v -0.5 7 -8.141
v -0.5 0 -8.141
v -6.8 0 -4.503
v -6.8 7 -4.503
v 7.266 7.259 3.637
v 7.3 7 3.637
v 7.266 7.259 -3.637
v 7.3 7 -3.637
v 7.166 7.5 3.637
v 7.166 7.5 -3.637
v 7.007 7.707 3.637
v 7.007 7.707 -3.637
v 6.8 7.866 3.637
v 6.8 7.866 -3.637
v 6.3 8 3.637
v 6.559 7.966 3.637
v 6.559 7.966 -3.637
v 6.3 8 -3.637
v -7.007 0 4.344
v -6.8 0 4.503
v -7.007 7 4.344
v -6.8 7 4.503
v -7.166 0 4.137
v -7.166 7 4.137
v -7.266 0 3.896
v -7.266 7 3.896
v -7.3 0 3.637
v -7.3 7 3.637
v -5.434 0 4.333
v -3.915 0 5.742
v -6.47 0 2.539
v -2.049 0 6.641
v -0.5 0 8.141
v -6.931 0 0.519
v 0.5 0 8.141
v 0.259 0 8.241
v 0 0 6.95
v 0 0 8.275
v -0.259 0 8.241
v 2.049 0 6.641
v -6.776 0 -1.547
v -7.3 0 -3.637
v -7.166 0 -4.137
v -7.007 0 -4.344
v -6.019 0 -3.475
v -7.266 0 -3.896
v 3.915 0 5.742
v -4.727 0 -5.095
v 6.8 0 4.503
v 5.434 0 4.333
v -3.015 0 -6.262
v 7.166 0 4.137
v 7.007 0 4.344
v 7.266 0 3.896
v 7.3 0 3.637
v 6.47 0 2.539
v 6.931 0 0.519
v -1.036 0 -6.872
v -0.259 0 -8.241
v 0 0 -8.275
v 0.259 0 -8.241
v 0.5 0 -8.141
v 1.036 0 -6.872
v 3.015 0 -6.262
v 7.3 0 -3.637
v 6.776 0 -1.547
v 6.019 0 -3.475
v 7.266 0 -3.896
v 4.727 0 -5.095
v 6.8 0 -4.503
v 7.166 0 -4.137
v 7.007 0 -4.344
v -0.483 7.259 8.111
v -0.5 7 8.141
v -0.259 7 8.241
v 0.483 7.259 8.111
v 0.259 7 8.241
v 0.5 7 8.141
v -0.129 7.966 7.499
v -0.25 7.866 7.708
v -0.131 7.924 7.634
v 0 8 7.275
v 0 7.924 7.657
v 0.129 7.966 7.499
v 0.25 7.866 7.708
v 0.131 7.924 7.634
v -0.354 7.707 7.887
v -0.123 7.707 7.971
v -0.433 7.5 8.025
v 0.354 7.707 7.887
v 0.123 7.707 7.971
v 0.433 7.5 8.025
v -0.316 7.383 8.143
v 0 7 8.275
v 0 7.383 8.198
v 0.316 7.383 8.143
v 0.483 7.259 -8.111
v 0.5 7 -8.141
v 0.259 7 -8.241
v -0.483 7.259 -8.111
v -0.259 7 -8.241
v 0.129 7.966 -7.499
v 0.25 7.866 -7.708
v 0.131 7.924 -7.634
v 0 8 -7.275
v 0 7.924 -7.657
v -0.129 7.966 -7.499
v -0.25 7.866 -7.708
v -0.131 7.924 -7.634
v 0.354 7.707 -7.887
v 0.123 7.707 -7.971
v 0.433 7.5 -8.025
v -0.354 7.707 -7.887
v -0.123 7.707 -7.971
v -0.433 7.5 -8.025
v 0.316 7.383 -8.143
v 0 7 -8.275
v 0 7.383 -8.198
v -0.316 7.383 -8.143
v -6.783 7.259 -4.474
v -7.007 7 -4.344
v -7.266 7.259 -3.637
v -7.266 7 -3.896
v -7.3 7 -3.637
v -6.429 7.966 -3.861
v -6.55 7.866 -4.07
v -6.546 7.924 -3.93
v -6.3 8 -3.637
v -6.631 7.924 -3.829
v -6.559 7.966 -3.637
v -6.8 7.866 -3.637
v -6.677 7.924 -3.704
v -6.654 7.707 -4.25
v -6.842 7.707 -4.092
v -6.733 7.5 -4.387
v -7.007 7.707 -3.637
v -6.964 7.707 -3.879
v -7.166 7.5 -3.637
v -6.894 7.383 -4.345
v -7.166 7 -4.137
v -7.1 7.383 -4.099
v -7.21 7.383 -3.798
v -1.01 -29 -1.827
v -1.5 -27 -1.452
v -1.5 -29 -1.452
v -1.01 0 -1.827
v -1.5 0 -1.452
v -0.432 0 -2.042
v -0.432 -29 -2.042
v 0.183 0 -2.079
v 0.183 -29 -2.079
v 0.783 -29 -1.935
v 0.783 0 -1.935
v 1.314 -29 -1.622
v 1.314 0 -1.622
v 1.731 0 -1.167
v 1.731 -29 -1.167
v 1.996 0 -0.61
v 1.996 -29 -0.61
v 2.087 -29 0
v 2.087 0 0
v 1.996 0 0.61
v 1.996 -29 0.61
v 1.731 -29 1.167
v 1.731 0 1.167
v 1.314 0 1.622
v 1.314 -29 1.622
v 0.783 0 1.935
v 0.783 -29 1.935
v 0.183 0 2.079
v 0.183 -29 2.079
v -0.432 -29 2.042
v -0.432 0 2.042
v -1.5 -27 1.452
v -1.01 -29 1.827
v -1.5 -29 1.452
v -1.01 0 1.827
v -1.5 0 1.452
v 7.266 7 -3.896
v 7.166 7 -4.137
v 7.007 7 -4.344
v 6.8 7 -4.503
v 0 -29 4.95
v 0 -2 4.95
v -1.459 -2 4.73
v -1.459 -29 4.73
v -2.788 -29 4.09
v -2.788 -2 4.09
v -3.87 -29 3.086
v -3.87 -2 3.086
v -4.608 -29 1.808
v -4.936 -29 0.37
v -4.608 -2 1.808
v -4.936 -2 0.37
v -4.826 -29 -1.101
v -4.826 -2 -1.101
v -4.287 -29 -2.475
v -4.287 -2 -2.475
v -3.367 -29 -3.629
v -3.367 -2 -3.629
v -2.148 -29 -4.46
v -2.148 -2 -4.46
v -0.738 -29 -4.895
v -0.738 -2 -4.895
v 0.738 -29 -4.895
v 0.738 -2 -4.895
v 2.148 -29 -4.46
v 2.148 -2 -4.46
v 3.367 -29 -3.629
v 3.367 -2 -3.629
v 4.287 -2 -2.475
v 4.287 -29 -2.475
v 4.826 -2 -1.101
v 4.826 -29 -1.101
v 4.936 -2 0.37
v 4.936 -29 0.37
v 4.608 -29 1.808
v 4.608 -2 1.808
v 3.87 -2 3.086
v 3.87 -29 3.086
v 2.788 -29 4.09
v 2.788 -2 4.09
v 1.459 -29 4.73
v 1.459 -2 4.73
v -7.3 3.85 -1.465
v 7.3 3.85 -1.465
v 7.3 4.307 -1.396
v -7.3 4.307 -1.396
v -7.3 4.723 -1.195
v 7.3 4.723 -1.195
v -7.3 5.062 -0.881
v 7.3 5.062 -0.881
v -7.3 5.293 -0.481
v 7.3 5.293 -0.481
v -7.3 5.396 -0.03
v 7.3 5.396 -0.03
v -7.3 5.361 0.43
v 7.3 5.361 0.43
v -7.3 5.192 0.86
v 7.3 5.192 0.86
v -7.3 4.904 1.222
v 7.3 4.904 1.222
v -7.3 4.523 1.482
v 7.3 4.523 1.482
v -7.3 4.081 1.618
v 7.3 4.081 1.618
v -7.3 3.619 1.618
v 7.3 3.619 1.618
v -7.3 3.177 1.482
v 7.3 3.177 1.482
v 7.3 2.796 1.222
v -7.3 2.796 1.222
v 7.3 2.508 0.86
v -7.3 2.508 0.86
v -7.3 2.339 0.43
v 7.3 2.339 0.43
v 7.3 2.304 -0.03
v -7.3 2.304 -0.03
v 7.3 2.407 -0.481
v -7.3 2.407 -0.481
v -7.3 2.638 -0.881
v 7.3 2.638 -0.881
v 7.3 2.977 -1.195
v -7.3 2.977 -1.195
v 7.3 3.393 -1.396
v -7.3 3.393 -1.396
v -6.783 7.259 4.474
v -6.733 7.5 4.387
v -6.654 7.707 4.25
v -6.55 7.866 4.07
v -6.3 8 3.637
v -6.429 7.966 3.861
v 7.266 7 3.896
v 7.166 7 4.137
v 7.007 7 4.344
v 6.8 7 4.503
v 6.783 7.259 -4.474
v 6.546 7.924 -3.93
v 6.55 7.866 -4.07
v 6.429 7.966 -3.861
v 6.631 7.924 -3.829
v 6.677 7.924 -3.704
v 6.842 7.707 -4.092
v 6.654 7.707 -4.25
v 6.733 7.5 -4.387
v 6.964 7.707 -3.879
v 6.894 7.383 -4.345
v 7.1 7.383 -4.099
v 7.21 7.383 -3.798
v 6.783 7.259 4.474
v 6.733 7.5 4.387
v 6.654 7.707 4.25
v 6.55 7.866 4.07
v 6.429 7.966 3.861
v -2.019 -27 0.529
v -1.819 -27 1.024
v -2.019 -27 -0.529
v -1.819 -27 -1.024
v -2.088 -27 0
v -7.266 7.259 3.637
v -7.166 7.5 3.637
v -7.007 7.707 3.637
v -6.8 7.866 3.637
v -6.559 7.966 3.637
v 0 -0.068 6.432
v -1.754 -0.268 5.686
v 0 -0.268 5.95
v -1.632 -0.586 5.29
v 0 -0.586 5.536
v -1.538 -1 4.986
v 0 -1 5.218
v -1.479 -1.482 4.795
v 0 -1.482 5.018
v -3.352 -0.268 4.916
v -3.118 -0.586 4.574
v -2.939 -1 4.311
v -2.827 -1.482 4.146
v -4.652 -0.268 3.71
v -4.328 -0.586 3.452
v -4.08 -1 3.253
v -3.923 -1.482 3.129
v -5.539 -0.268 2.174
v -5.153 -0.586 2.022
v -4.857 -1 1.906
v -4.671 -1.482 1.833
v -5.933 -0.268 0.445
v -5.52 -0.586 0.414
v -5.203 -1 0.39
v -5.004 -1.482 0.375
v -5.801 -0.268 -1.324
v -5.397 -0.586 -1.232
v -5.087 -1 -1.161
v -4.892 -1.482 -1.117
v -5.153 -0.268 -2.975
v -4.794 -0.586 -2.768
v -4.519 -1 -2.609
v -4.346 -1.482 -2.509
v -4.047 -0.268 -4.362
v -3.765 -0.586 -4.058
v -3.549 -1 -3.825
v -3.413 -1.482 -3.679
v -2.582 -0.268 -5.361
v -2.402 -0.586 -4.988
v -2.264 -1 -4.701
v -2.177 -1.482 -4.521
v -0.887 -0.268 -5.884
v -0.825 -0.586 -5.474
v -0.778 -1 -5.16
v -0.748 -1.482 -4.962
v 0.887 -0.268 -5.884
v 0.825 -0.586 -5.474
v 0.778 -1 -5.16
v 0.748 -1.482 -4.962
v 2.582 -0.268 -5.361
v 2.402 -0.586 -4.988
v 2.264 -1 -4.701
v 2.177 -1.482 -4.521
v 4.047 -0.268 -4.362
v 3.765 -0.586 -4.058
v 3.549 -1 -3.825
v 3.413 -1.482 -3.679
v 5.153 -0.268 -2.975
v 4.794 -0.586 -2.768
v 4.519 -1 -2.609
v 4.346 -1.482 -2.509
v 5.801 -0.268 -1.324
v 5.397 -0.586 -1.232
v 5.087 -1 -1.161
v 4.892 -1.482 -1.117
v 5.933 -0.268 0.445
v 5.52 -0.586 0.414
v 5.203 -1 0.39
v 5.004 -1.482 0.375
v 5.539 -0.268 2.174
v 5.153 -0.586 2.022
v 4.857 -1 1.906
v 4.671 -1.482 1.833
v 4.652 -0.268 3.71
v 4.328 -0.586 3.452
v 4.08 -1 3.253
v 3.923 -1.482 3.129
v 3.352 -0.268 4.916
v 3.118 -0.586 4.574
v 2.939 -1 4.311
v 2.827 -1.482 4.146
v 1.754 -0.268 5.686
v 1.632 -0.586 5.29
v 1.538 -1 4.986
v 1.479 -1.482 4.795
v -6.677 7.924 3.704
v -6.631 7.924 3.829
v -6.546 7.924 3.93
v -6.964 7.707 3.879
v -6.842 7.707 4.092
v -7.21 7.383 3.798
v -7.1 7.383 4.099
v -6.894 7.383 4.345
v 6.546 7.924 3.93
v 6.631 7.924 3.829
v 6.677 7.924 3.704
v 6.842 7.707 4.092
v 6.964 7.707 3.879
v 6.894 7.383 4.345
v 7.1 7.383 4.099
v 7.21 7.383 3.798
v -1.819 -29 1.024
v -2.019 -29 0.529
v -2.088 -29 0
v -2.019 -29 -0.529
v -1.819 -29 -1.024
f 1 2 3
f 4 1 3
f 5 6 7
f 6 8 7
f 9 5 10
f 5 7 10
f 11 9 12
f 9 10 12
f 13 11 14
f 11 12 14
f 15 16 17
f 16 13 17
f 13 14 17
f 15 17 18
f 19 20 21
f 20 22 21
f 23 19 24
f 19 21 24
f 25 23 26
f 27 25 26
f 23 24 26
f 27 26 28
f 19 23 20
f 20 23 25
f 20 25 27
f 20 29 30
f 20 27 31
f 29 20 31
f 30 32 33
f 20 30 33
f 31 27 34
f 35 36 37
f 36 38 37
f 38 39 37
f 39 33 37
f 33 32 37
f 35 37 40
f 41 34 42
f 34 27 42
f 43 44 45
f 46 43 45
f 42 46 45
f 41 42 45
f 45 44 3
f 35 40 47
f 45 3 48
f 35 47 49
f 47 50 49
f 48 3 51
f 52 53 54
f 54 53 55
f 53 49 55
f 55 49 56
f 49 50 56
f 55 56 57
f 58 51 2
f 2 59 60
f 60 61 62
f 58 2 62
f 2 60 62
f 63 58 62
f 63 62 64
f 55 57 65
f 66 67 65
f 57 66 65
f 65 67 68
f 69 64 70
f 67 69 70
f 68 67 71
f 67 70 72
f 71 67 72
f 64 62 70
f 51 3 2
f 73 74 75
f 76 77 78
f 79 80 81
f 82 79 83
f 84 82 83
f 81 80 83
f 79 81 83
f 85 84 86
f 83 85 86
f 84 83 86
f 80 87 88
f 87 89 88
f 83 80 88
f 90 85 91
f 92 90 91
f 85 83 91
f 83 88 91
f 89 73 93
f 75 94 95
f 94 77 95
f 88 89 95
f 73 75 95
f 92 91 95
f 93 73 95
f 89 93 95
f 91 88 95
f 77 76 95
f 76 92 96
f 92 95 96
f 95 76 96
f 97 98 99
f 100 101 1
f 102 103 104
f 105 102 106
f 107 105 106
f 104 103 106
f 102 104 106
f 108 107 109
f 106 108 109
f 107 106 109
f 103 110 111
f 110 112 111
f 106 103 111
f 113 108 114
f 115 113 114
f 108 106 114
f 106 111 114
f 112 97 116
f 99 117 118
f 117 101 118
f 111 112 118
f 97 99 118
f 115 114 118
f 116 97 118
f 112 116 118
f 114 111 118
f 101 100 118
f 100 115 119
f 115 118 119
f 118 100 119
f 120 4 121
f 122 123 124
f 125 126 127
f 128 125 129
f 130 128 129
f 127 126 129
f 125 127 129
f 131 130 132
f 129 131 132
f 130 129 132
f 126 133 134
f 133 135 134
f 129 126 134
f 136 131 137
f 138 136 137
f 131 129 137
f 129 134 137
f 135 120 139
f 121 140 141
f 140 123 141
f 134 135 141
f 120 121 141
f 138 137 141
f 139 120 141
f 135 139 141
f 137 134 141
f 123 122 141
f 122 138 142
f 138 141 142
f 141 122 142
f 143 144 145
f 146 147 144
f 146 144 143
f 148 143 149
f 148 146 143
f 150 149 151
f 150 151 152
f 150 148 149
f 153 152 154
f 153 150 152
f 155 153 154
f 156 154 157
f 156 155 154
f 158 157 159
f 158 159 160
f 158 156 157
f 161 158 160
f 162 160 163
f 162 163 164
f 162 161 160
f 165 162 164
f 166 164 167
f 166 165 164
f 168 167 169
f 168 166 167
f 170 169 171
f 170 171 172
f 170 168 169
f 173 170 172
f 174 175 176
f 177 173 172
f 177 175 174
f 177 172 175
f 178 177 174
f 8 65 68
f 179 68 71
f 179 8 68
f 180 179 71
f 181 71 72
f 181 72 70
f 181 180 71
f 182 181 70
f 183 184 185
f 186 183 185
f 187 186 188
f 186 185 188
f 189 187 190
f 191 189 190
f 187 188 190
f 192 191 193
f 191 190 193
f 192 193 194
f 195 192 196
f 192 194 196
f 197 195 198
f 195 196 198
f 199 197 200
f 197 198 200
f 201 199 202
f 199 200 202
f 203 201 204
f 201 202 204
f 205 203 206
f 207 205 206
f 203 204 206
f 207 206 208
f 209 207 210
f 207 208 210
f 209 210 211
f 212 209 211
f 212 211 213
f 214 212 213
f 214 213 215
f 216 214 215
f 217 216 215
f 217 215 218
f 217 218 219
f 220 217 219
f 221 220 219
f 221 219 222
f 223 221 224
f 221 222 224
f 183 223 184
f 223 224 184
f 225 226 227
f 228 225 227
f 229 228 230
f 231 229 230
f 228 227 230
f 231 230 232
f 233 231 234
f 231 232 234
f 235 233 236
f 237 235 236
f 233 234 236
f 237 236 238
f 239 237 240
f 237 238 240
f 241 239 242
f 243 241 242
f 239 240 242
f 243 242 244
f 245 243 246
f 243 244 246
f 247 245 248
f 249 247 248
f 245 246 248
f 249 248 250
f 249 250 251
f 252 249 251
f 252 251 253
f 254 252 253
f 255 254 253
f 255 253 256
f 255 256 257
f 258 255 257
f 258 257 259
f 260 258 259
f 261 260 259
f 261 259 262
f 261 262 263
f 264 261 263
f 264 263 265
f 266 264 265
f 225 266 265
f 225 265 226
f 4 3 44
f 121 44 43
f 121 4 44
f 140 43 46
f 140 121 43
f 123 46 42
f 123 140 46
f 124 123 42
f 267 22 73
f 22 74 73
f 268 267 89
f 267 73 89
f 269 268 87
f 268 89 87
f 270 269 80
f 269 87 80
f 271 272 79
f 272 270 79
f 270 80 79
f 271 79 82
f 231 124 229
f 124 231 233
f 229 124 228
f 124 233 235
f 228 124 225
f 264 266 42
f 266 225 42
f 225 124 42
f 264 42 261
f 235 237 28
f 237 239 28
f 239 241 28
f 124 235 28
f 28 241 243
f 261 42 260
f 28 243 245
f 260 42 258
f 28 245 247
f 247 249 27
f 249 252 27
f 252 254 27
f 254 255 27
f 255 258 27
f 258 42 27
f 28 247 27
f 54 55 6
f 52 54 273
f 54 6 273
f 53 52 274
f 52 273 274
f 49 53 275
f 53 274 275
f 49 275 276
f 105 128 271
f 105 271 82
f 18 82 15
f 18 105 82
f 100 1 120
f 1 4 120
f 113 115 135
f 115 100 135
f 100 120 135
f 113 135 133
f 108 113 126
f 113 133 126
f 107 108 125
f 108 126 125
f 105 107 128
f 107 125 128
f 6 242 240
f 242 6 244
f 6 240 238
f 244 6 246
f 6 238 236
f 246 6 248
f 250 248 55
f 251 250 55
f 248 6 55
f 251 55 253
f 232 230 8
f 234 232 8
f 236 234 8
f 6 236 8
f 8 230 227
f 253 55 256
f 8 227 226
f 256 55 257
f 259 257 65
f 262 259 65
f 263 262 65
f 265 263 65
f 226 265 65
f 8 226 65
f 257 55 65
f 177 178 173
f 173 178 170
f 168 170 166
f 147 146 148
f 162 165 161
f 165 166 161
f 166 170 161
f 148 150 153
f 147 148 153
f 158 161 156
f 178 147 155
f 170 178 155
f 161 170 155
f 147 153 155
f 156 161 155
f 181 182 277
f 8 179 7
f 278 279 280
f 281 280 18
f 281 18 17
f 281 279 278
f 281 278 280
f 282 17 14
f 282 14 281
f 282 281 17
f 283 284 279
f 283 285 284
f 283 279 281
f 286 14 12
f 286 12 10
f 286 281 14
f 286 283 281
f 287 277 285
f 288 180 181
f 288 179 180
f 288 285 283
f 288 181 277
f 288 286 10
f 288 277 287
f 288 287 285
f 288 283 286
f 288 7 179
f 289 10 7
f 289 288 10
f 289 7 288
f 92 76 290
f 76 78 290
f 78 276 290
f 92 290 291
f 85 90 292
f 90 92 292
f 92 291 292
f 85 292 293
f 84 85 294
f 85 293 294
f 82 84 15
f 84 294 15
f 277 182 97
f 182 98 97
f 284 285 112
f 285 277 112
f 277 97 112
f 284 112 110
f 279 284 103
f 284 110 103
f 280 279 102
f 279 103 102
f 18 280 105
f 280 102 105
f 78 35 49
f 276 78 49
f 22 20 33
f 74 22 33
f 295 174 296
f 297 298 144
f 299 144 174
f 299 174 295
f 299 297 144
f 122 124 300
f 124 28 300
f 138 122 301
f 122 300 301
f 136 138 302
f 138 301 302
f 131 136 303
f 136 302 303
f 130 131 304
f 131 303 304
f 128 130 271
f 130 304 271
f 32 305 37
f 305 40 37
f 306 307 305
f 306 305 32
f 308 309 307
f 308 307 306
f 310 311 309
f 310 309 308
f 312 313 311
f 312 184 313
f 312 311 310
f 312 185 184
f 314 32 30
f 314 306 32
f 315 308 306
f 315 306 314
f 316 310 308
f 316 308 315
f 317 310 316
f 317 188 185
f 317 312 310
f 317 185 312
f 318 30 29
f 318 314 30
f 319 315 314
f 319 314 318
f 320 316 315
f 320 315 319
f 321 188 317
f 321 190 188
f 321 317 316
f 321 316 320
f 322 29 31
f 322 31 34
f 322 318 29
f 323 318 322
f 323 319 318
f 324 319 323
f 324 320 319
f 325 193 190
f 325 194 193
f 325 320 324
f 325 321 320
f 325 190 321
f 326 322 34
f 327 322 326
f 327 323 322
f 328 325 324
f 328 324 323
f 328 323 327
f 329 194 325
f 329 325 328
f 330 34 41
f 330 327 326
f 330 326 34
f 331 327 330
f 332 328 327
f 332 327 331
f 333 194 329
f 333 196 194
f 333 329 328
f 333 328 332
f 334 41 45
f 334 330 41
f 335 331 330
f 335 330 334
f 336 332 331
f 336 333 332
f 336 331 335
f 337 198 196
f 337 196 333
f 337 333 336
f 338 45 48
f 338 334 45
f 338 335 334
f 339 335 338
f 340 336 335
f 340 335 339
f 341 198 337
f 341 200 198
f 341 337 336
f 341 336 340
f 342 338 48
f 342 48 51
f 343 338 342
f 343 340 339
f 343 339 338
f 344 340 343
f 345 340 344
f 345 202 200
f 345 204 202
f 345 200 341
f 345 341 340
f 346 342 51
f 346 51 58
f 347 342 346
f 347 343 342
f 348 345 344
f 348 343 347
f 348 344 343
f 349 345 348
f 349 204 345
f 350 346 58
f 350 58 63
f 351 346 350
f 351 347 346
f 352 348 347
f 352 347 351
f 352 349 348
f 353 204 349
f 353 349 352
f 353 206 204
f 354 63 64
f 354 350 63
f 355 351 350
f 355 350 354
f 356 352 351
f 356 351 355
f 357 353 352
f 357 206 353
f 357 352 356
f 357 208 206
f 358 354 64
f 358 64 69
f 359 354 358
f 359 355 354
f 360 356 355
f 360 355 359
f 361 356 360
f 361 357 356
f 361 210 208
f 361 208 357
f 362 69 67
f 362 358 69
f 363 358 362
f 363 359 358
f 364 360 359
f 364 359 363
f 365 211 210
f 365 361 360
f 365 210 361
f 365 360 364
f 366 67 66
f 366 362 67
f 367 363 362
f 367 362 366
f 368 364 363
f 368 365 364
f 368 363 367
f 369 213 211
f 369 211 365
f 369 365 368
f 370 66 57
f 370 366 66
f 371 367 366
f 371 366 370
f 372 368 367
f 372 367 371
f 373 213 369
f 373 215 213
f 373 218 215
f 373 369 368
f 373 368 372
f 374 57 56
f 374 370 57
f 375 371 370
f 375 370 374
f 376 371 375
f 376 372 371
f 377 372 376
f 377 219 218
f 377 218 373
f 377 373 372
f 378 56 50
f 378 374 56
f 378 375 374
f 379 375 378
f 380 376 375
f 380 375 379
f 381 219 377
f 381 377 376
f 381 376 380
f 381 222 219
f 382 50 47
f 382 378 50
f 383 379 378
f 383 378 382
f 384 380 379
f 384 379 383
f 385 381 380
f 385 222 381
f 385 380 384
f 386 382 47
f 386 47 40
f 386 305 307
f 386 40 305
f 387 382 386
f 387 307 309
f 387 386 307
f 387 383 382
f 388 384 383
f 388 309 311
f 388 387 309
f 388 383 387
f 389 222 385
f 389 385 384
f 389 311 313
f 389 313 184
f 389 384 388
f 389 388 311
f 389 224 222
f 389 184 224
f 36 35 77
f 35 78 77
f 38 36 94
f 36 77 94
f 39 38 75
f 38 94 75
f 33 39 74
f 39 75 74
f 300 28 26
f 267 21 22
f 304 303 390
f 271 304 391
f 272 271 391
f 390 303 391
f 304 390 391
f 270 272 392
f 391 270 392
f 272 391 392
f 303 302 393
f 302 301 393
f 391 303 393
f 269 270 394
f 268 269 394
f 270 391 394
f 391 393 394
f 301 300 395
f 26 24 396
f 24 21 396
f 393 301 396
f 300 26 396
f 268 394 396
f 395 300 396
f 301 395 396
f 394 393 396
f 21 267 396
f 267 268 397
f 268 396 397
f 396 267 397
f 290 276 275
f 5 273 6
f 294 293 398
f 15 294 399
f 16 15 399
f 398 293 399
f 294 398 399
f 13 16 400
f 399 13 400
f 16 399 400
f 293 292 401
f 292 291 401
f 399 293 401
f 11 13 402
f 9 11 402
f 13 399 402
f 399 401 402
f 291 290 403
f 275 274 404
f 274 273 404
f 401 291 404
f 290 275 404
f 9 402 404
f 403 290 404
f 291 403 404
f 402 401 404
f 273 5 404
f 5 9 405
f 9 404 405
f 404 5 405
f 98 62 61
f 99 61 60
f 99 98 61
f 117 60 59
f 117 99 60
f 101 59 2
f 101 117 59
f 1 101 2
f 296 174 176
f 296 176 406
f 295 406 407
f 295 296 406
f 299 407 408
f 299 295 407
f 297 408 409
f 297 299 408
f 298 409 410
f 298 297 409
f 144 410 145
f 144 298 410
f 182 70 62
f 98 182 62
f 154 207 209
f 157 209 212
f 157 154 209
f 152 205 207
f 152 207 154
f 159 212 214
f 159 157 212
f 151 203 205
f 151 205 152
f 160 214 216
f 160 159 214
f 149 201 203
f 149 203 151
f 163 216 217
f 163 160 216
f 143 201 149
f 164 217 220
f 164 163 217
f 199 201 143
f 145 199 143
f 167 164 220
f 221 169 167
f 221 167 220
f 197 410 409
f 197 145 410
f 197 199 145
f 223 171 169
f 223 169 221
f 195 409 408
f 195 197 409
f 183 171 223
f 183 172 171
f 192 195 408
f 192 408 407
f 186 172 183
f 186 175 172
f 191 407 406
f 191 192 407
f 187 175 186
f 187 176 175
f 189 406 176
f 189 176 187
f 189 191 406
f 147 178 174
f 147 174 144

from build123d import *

# Parameters (mm, degrees)
BOSS_EXTRUDE1_DEPTH = 8
SKETCH2_R           = 4.95
BOSS_EXTRUDE2_DEPTH = 29
FILLET1_R           = 2
SKETCH3_R           = 1.55
CUT_EXTRUDE1_DEPTH  = 34.544199697
FILLET2_R           = 1
CUT_EXTRUDE3_START  = -2
SKETCH5_R           = 2.0875
CUT_EXTRUDE3_DEPTH  = 2


with BuildPart() as part:
    # Sketch1 → Boss-Extrude1 (new body)
    with BuildSketch(Plane(origin=(0, 0, 0), x_dir=(1, 0, 0), z_dir=(0, 1, 0))):
        Polygon((7.3, -4.214656965), (7.3, 4.214656965), (0, 8.42931393), (-7.3, 4.214656965), (-7.3, -4.214656965), (0, -8.42931393), align=None)
    extrude(amount=BOSS_EXTRUDE1_DEPTH)

    # Sketch2 → Boss-Extrude2 (add)
    with BuildSketch(Plane.XZ):
        with Locations(Location((0, 0, 0), (0, 0, 90))):
            Circle(SKETCH2_R)
        with BuildLine():
            Line((-1.5, 1.451776928), (-1.5, -1.451776928))
            ThreePointArc((-1.5, -1.451776928), (2.0875, 0), (-1.5, 1.451776928))
        make_face(mode=Mode.SUBTRACT)
    extrude(amount=BOSS_EXTRUDE2_DEPTH)

    # Fillet1
    fillet1_edges = [part.edges().sort_by_distance(p)[0] for p in [
        (0, 0, -4.95),
    ]]
    fillet(fillet1_edges, radius=FILLET1_R)

    # Sketch3 → Cut-Extrude1 (cut, through all)
    with BuildSketch(Plane(origin=(7.3, 0, 0), x_dir=(0, 0, -1), z_dir=(1, 0, 0))):
        with Locations((-0.085343035, 3.85)):
            Circle(SKETCH3_R)
    extrude(amount=-CUT_EXTRUDE1_DEPTH, mode=Mode.SUBTRACT)

    # Fillet2
    fillet2_edges = [part.edges().sort_by_distance(p)[0] for p in [
        (0, 4, 8.42931393),
        (-7.3, 4, 4.214656965),
        (-7.3, 4, -4.214656965),
        (0, 4, -8.42931393),
        (7.3, 4, -4.214656965),
        (7.3, 4, 4.214656965),
        (3.65, 8, -6.321985448),
        (-3.65, 8, -6.321985448),
        (-7.3, 8, 0),
        (-3.65, 8, 6.321985448),
        (3.65, 8, 6.321985448),
        (7.3, 8, 0),
    ]]
    fillet(fillet2_edges, radius=FILLET2_R)

    # Sketch5 → Cut-Extrude3 (cut)
    with BuildSketch(Plane.XZ.offset(29).offset(CUT_EXTRUDE3_START)):
        with Locations(Location((0, 0, 0), (0, 0, 135.935955789))):
            Circle(SKETCH5_R)
    extrude(amount=CUT_EXTRUDE3_DEPTH, mode=Mode.SUBTRACT)


solid = part.part
